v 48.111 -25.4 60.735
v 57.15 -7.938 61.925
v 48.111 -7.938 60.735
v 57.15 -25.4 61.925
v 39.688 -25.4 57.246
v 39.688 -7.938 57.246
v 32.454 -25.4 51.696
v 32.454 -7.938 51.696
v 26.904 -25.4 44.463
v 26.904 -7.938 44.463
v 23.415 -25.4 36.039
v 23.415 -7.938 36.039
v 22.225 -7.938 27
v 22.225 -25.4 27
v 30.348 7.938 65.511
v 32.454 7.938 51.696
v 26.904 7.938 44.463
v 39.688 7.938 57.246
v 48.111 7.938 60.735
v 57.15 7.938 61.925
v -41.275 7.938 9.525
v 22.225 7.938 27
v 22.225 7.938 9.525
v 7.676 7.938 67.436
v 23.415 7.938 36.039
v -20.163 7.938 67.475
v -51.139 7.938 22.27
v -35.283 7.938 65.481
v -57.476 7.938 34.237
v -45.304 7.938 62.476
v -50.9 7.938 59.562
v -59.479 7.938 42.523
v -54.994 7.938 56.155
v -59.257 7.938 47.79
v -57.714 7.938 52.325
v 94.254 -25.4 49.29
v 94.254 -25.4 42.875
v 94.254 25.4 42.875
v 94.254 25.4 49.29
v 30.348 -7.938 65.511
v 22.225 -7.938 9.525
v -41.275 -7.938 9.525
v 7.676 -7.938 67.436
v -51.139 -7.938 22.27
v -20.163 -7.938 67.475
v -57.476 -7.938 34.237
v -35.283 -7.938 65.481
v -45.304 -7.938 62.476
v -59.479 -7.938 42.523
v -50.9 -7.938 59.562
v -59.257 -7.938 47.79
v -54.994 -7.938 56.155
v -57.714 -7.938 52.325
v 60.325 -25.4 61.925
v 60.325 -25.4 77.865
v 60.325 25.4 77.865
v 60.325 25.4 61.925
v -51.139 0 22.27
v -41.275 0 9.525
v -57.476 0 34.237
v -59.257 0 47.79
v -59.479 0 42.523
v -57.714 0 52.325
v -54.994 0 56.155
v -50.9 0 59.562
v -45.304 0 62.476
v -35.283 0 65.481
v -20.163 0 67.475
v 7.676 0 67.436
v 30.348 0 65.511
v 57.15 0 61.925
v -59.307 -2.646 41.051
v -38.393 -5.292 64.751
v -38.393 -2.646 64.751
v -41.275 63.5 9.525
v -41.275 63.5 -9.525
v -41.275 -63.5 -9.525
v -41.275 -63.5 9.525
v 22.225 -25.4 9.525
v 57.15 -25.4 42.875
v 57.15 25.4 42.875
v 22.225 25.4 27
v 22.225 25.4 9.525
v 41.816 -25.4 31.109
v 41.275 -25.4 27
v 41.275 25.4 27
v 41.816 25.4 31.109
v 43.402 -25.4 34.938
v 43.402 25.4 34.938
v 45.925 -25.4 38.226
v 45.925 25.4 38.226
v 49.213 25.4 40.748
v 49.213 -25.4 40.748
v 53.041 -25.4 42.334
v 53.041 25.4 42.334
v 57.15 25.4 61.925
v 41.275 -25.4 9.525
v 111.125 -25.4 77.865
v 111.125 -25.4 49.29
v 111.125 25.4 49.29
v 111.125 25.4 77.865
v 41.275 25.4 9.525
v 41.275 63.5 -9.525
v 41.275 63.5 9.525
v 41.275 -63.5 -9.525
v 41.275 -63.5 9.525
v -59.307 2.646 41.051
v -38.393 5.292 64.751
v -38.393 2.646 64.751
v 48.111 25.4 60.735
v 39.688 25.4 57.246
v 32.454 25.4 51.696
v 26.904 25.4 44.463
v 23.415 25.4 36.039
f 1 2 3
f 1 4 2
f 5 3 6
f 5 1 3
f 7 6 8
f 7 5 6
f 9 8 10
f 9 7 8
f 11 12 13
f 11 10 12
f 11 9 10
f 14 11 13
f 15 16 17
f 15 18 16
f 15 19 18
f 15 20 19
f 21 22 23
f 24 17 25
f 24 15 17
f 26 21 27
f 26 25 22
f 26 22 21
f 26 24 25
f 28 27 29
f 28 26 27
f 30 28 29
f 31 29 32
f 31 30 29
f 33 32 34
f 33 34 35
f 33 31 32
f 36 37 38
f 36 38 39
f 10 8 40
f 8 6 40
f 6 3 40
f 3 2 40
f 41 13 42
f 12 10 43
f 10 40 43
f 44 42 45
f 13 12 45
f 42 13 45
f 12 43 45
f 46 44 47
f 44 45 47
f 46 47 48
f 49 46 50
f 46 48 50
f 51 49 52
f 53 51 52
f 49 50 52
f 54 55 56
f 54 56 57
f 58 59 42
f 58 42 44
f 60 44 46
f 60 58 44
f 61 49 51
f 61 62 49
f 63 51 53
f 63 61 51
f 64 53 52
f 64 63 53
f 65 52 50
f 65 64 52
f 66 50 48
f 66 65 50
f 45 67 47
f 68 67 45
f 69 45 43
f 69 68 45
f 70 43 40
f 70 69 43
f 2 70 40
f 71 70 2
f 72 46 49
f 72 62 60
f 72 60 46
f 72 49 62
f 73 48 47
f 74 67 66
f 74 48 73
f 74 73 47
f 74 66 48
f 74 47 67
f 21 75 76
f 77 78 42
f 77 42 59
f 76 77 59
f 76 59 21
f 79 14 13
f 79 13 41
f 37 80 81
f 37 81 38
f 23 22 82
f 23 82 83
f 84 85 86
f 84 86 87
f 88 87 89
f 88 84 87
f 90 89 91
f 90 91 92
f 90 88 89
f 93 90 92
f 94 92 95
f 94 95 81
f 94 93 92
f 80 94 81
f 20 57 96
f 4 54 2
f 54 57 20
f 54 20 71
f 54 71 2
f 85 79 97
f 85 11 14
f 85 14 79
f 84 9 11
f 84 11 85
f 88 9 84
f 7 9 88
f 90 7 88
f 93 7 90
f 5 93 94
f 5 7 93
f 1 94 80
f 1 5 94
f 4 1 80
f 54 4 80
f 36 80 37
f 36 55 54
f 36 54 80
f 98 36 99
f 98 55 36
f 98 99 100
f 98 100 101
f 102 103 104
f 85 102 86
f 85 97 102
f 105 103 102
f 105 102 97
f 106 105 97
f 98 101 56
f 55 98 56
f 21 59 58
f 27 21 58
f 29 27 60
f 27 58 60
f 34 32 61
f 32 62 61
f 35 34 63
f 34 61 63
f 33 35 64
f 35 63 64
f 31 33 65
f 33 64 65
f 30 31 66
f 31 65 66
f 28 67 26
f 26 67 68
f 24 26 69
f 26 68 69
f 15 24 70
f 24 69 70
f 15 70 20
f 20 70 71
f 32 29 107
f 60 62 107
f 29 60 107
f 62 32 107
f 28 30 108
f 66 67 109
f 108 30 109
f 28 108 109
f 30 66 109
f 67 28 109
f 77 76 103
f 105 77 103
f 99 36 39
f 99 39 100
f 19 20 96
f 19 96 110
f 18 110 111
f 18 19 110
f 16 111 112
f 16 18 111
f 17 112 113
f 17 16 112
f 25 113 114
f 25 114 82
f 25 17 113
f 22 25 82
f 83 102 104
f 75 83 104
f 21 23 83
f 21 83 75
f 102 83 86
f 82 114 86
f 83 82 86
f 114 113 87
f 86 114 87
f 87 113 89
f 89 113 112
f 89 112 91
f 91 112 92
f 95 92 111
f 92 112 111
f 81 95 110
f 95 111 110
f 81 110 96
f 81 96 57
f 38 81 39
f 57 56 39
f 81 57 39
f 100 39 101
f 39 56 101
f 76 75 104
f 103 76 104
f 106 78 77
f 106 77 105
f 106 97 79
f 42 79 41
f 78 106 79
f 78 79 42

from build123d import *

# Parameters (mm, degrees)
F1_DEPTH = 63.5
F0_W     = 33.928780768
F0_H     = 12.6356402498
F2_DEPTH = 25.4
F3_DEPTH = 7.9375


with BuildPart() as f1:
    # F0 (on Front) → F1 (new body, symmetric)
    with BuildSketch(Plane.XZ):
        Polygon((-41.275, 9.525), (-41.275, -9.525), (41.275, -9.525), (41.275, 9.525), (22.225, 9.525), align=None)
    extrude(amount=F1_DEPTH, both=True)

    # F0 (on Front) → F2 (join, symmetric)
    with BuildSketch(Plane.XZ):
        with BuildLine():
            Line((22.225, 9.525), (41.275, 9.525))
            Line((41.275, 9.525), (41.275, 27.0002))
            ThreePointArc((41.275, 27.0002), (45.9246798487, 38.2255201513), (57.15, 42.8752))
            Line((57.15, 42.8752), (94.253780768, 42.8752))
            Line((94.253780768, 42.8752), (94.253780768, 49.2895597502))
            Line((94.253780768, 49.2895597502), (60.325, 49.2895597502))
            Line((60.325, 49.2895597502), (60.325, 61.9252))
            Line((60.325, 61.9252), (57.15, 61.9252))
            ThreePointArc((57.15, 61.9252), (32.4542956671, 51.6959043329), (22.225, 27.0002))
            Line((22.225, 27.0002), (22.225, 9.525))
        make_face()
        Polygon((60.325, 77.8645597502), (60.325, 61.9252), (94.253780768, 61.9252), (94.253780768, 49.2895597502), (111.125, 49.2895597502), (111.125, 77.8645597502), align=None)
        with Locations((77.289390384, 55.6073798751)):
            Rectangle(F0_W, F0_H)
    extrude(amount=F2_DEPTH, both=True)

    # F0 (on Front) → F3 (join, symmetric)
    with BuildSketch(Plane.XZ):
        with BuildLine():
            add(Edge.make_bspline(
                [(-41.275, 9.525), (-66.8876323333, 38.7312213145), (-87.5999182085, 84.2466196499), (57.15, 61.9252)],
                knots=[0, 0, 0, 0, 111.5045361635, 111.5045361635, 111.5045361635, 111.5045361635], degree=3))
            Line((-41.275, 9.525), (22.225, 9.525))
            Line((22.225, 9.525), (22.225, 27.0002))
            ThreePointArc((22.225, 27.0002), (32.4542956671, 51.6959043329), (57.15, 61.9252))
        make_face()
    extrude(amount=F3_DEPTH, both=True)


solid = f1.part
